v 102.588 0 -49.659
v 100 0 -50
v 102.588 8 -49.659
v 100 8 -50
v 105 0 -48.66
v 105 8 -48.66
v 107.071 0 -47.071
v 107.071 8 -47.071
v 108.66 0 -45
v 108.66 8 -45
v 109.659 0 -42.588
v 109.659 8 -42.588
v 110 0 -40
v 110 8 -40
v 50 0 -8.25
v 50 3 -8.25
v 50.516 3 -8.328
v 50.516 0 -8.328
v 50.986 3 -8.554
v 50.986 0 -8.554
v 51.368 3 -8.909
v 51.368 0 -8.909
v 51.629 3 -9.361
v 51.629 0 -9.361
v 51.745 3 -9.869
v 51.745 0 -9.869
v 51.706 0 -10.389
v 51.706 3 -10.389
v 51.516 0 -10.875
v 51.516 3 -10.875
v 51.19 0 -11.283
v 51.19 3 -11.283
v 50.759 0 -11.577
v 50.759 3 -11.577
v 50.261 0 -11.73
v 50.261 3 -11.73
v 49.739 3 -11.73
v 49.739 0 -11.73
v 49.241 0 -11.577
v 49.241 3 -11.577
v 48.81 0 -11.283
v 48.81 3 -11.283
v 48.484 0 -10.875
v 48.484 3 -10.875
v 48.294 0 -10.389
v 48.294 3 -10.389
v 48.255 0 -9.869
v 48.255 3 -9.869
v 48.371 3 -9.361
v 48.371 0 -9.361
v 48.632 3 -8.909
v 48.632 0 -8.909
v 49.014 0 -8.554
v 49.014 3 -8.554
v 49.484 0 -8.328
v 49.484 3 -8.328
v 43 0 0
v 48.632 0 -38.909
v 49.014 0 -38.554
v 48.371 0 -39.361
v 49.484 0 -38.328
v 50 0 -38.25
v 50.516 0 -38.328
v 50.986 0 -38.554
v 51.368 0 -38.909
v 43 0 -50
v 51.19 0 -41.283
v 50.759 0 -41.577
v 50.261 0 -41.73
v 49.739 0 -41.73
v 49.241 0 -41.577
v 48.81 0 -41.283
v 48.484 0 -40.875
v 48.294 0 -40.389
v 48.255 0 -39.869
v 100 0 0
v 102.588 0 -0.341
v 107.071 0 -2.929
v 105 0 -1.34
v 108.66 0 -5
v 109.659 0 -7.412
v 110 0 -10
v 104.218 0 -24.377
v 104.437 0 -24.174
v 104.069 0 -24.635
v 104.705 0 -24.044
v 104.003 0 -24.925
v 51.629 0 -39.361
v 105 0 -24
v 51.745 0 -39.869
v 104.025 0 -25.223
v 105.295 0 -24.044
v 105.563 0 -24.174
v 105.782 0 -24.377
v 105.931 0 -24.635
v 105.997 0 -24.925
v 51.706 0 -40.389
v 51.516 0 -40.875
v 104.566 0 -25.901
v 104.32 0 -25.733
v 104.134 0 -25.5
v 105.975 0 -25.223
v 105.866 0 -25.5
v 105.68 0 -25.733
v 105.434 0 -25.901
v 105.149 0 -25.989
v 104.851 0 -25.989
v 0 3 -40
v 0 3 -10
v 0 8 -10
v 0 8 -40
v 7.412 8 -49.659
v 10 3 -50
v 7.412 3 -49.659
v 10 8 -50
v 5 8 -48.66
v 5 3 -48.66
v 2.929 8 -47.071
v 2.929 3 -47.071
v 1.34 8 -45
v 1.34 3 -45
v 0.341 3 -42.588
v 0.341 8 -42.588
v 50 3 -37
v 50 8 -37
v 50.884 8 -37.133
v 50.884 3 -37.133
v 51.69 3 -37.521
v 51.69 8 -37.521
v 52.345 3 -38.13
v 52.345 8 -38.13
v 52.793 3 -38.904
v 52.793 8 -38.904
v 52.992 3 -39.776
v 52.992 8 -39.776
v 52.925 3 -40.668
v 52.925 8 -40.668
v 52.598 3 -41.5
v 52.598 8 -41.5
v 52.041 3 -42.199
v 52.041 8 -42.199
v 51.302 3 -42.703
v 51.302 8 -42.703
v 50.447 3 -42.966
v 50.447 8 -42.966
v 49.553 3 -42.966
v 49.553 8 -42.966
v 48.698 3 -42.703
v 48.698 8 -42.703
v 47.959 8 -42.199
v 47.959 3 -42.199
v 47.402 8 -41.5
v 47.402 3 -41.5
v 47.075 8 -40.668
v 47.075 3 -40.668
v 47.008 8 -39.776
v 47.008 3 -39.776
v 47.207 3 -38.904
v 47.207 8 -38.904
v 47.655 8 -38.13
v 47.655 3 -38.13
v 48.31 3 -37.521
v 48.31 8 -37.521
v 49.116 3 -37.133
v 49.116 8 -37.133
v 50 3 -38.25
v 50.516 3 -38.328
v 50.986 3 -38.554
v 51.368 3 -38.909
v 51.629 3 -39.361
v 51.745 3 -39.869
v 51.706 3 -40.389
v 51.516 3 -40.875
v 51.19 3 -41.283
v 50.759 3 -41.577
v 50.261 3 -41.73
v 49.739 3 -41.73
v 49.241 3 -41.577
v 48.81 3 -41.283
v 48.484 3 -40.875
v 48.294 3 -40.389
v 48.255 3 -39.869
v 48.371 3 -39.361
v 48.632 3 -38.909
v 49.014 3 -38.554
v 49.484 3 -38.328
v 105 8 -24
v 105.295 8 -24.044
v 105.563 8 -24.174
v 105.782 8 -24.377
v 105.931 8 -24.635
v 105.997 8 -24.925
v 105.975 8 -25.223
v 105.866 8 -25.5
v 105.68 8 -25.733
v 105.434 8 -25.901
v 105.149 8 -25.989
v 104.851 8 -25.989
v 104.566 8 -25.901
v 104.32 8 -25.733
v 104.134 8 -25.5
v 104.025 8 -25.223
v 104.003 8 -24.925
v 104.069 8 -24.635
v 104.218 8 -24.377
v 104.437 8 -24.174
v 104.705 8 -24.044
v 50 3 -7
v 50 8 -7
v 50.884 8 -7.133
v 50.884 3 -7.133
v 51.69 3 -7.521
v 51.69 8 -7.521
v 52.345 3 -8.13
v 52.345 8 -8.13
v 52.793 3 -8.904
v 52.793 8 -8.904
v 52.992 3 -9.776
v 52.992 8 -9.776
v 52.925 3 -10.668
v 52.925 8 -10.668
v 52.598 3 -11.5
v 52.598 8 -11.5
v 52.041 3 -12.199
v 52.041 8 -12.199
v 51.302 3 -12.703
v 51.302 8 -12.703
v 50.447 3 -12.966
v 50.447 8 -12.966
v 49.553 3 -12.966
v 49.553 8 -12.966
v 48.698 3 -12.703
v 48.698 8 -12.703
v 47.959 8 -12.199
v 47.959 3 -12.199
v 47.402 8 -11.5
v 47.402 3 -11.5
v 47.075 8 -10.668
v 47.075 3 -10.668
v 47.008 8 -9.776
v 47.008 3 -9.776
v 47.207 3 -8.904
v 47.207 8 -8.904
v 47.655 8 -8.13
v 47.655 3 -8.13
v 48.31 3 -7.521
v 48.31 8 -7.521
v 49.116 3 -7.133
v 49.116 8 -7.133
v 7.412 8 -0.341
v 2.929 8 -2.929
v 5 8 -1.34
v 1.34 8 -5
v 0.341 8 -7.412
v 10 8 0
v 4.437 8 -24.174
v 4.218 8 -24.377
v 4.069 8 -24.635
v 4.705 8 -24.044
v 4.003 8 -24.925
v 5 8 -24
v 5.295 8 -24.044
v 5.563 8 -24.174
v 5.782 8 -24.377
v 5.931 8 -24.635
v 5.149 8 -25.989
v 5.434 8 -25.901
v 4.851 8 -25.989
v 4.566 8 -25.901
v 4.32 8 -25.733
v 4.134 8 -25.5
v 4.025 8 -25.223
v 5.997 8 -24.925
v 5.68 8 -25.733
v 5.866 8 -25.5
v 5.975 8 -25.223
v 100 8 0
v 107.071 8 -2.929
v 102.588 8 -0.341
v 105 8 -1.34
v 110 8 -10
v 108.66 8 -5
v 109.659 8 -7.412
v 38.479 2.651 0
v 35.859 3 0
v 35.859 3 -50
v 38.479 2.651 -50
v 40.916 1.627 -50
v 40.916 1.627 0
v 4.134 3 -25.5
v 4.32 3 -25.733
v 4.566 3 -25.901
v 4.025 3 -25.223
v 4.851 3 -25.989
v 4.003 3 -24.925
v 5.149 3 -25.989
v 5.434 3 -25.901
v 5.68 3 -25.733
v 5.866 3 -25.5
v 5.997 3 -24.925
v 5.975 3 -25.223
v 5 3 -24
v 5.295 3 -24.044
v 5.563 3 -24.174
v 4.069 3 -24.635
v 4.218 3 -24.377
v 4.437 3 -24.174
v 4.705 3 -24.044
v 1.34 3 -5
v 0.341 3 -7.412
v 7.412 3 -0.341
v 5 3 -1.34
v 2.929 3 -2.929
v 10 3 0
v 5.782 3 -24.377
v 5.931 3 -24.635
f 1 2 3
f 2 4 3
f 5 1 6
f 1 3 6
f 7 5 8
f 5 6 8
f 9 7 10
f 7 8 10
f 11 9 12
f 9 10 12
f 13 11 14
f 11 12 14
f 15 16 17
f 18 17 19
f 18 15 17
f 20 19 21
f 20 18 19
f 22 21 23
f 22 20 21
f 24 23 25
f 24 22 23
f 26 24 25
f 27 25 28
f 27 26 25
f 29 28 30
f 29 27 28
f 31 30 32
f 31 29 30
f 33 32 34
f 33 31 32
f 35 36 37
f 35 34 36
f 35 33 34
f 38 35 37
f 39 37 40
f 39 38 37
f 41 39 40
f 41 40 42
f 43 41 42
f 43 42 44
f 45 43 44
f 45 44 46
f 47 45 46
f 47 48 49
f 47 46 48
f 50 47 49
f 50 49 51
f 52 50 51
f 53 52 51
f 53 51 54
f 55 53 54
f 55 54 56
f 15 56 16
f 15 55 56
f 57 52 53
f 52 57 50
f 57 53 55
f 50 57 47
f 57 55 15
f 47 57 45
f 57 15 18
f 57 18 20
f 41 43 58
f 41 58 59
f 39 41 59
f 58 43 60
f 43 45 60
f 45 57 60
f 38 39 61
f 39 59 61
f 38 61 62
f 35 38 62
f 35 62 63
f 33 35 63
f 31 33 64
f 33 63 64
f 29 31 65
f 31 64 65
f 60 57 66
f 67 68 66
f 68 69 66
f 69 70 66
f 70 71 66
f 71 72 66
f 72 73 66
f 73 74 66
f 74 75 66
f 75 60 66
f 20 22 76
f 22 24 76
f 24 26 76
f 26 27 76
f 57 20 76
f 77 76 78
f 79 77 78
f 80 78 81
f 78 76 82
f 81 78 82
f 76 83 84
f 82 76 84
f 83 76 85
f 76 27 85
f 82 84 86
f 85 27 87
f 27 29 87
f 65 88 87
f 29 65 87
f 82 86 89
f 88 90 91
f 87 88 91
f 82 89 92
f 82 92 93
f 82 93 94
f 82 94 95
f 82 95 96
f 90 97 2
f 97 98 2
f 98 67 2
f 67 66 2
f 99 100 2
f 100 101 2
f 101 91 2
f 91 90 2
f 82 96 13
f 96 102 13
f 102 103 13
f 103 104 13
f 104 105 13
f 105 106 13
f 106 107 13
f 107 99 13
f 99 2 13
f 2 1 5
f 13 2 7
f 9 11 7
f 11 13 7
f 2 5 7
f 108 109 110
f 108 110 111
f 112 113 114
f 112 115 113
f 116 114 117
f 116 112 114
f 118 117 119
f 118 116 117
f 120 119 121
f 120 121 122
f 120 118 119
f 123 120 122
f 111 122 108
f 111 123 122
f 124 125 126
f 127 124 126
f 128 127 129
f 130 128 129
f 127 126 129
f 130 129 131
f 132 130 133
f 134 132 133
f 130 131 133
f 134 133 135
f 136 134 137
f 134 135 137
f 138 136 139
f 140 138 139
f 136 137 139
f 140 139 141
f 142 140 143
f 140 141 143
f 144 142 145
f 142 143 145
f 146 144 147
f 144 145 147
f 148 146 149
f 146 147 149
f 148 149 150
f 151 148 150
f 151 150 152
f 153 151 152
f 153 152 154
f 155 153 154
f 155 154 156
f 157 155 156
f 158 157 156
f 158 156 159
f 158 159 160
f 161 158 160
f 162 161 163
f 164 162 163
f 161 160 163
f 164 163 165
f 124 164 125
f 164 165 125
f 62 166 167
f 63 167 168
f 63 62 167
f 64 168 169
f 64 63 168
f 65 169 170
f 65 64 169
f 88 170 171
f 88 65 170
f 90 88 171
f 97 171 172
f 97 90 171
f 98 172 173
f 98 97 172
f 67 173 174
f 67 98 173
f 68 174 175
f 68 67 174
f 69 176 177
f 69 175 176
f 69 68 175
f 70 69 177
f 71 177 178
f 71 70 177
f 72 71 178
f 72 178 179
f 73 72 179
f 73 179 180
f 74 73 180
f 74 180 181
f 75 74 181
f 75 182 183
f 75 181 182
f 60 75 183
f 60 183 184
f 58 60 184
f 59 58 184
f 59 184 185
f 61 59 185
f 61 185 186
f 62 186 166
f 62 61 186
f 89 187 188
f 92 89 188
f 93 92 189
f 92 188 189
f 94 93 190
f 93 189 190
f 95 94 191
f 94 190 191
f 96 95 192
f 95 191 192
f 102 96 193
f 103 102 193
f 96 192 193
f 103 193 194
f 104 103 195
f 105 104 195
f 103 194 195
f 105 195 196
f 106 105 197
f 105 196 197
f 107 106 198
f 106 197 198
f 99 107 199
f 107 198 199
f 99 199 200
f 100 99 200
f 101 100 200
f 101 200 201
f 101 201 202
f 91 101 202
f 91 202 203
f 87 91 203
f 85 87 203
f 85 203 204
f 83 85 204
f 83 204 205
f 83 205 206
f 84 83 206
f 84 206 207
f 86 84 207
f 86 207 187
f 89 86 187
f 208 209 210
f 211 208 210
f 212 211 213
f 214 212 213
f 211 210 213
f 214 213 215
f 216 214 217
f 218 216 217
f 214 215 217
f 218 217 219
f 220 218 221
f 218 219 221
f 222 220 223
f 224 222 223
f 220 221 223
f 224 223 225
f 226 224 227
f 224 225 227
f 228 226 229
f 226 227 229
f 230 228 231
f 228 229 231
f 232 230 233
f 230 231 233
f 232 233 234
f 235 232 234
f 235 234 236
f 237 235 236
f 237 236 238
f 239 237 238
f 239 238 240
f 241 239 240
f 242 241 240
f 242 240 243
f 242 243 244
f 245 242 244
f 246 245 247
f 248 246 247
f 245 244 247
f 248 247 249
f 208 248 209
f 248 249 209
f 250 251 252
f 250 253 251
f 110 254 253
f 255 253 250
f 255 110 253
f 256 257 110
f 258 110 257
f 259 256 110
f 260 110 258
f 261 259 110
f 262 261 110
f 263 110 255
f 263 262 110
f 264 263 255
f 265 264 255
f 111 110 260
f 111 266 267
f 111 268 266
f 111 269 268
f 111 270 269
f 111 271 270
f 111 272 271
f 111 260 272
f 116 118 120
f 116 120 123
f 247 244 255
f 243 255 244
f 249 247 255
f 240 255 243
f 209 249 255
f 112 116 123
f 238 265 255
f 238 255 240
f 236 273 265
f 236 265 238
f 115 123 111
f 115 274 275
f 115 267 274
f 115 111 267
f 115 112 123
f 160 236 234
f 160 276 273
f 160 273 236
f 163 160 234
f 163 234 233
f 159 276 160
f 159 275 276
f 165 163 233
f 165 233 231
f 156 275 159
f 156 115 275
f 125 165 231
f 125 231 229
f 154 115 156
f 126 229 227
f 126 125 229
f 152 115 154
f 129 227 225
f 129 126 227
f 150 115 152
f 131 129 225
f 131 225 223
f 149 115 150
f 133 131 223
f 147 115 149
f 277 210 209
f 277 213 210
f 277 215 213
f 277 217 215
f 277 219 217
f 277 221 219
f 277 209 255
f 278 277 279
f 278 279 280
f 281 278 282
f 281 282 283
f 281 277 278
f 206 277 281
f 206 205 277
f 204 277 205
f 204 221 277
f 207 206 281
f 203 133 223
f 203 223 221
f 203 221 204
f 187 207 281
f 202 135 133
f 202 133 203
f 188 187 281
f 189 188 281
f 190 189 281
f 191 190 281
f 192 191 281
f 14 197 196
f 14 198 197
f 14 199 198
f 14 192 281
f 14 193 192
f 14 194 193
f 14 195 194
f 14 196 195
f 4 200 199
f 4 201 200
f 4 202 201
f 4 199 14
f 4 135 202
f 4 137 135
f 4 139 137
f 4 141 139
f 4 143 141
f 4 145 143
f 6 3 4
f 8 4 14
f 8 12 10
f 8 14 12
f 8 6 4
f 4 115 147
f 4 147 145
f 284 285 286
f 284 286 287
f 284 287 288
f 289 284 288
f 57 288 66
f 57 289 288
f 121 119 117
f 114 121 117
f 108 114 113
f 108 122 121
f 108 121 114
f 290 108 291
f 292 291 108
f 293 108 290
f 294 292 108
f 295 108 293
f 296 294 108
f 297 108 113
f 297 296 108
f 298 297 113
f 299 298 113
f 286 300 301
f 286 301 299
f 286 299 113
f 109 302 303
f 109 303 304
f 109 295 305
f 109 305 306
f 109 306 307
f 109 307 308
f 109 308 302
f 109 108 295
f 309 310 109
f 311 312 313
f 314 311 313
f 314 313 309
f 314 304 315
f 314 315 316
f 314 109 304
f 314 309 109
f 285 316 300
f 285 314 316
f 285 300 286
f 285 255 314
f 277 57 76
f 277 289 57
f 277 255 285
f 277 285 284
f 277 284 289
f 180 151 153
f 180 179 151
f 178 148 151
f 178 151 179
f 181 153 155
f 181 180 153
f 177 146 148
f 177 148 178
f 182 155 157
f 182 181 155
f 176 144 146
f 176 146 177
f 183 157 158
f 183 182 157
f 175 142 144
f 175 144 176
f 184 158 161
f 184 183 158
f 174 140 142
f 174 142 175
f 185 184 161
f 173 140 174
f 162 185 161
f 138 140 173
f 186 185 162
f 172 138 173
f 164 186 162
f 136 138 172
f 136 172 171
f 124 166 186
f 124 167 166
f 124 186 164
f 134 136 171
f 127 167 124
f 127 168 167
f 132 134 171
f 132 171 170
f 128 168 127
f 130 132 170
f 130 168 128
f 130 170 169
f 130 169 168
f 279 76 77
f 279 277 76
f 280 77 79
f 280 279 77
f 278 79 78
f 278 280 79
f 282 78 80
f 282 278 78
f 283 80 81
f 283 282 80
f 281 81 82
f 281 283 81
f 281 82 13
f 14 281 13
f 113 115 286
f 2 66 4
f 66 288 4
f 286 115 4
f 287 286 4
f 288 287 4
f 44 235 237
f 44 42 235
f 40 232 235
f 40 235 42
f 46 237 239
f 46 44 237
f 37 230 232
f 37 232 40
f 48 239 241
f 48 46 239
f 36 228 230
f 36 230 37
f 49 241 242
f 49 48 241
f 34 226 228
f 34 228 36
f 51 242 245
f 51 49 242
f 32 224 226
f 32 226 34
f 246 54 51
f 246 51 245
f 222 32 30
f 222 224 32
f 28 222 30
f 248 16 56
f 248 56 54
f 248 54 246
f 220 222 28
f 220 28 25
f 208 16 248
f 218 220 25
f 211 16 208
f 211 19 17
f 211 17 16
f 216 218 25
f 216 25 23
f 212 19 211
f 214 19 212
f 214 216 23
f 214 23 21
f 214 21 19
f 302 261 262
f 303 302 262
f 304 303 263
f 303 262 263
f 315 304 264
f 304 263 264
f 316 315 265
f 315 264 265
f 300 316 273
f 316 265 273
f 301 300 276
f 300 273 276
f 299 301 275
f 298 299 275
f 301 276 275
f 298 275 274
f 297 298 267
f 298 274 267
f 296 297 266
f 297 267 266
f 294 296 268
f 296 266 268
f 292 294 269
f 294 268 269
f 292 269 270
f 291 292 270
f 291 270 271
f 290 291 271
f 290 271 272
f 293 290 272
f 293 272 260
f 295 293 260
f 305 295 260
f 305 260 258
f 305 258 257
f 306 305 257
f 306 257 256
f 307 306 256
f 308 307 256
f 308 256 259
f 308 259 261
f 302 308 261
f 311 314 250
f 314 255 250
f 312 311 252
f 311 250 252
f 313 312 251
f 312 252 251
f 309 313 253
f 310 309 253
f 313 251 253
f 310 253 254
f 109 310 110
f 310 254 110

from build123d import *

# Parameters (mm, degrees)
SKETCH1_W           = 110
SKETCH1_H           = 50
SKETCH1_R           = 1.75
BOSS_EXTRUDE1_DEPTH = 8
SKETCH2_W           = 43
SKETCH2_H           = 50
CUT_EXTRUDE1_DEPTH  = 3
SKETCH3_R           = 3
CUT_EXTRUDE2_DEPTH  = 5
FILLET1_R           = 10
FILLET2_R           = 10
SKETCH4_R           = 1
CUT_EXTRUDE3_DEPTH  = 122.095004026


with BuildPart() as part:
    # Sketch1 → Boss-Extrude1 (new body)
    with BuildSketch(Plane(origin=(0, 0, 0), x_dir=(1, 0, 0), z_dir=(0, 1, 0))):
        with Locations((55, 25)):
            Rectangle(SKETCH1_W, SKETCH1_H)
        with Locations(Location((50, 40, 0), (0, 0, 270))):
            Circle(SKETCH1_R, mode=Mode.SUBTRACT)
        with Locations(Location((50, 10, 0), (0, 0, 270))):
            Circle(SKETCH1_R, mode=Mode.SUBTRACT)
    extrude(amount=BOSS_EXTRUDE1_DEPTH)

    # Sketch2 → Cut-Extrude1 (cut)
    with BuildSketch(Plane.XZ):
        with Locations((21.5, -25)):
            Rectangle(SKETCH2_W, SKETCH2_H)
    extrude(amount=-CUT_EXTRUDE1_DEPTH, mode=Mode.SUBTRACT)

    # Sketch3 → Cut-Extrude2 (cut)
    with BuildSketch(Plane(origin=(0, 8, 0), x_dir=(1, 0, 0), z_dir=(0, 1, 0))):
        with Locations(Location((50, 40, 0), (0, 0, 270))):
            Circle(SKETCH3_R)
        with Locations(Location((50, 10, 0), (0, 0, 270))):
            Circle(SKETCH3_R)
    extrude(amount=-CUT_EXTRUDE2_DEPTH, mode=Mode.SUBTRACT)

    # Fillet1
    # the kernel refuses this fillet: 10 mm, written as the material it adds along each edge
    with BuildSketch(Plane(origin=(43, 3, 0), x_dir=(-1, 0, 0), z_dir=(0, 0, -1))) as fillet1_piece_1:
        with BuildLine():
            CenterArc((7.141428429, -10), FILLET1_R, 90, 45.572995999)
            Line((0, -3), (-0.142828569, -2.86))
            ThreePointArc((-0.142828569, -2.86), (-0.2, -1.5), (-0.2, 0))
            Line((-0.2, 0), (0, 0.2))
            Line((0, 0.2), (7.141428429, 0.2))
            Line((7.141428429, 0.2), (7.141428429, 0))
        make_face()
    extrude(amount=50)

    # Fillet2
    fillet2_edges = [part.edges().sort_by_distance(p)[0] for p in [
        (0, 5.5, -50),
        (110, 4, -50),
        (110, 4, 0),
        (0, 5.5, 0),
    ]]
    fillet(fillet2_edges, radius=FILLET2_R)

    # Sketch4 → Cut-Extrude3 (cut, through all)
    with BuildSketch(Plane(origin=(0, 8, 0), x_dir=(1, 0, 0), z_dir=(0, 1, 0))):
        with Locations(Location((5, 25, 0), (0, 0, 270))):
            Circle(SKETCH4_R)
        with Locations(Location((105, 25, 0), (0, 0, 270))):
            Circle(SKETCH4_R)
    extrude(amount=-CUT_EXTRUDE3_DEPTH, mode=Mode.SUBTRACT)


solid = part.part
